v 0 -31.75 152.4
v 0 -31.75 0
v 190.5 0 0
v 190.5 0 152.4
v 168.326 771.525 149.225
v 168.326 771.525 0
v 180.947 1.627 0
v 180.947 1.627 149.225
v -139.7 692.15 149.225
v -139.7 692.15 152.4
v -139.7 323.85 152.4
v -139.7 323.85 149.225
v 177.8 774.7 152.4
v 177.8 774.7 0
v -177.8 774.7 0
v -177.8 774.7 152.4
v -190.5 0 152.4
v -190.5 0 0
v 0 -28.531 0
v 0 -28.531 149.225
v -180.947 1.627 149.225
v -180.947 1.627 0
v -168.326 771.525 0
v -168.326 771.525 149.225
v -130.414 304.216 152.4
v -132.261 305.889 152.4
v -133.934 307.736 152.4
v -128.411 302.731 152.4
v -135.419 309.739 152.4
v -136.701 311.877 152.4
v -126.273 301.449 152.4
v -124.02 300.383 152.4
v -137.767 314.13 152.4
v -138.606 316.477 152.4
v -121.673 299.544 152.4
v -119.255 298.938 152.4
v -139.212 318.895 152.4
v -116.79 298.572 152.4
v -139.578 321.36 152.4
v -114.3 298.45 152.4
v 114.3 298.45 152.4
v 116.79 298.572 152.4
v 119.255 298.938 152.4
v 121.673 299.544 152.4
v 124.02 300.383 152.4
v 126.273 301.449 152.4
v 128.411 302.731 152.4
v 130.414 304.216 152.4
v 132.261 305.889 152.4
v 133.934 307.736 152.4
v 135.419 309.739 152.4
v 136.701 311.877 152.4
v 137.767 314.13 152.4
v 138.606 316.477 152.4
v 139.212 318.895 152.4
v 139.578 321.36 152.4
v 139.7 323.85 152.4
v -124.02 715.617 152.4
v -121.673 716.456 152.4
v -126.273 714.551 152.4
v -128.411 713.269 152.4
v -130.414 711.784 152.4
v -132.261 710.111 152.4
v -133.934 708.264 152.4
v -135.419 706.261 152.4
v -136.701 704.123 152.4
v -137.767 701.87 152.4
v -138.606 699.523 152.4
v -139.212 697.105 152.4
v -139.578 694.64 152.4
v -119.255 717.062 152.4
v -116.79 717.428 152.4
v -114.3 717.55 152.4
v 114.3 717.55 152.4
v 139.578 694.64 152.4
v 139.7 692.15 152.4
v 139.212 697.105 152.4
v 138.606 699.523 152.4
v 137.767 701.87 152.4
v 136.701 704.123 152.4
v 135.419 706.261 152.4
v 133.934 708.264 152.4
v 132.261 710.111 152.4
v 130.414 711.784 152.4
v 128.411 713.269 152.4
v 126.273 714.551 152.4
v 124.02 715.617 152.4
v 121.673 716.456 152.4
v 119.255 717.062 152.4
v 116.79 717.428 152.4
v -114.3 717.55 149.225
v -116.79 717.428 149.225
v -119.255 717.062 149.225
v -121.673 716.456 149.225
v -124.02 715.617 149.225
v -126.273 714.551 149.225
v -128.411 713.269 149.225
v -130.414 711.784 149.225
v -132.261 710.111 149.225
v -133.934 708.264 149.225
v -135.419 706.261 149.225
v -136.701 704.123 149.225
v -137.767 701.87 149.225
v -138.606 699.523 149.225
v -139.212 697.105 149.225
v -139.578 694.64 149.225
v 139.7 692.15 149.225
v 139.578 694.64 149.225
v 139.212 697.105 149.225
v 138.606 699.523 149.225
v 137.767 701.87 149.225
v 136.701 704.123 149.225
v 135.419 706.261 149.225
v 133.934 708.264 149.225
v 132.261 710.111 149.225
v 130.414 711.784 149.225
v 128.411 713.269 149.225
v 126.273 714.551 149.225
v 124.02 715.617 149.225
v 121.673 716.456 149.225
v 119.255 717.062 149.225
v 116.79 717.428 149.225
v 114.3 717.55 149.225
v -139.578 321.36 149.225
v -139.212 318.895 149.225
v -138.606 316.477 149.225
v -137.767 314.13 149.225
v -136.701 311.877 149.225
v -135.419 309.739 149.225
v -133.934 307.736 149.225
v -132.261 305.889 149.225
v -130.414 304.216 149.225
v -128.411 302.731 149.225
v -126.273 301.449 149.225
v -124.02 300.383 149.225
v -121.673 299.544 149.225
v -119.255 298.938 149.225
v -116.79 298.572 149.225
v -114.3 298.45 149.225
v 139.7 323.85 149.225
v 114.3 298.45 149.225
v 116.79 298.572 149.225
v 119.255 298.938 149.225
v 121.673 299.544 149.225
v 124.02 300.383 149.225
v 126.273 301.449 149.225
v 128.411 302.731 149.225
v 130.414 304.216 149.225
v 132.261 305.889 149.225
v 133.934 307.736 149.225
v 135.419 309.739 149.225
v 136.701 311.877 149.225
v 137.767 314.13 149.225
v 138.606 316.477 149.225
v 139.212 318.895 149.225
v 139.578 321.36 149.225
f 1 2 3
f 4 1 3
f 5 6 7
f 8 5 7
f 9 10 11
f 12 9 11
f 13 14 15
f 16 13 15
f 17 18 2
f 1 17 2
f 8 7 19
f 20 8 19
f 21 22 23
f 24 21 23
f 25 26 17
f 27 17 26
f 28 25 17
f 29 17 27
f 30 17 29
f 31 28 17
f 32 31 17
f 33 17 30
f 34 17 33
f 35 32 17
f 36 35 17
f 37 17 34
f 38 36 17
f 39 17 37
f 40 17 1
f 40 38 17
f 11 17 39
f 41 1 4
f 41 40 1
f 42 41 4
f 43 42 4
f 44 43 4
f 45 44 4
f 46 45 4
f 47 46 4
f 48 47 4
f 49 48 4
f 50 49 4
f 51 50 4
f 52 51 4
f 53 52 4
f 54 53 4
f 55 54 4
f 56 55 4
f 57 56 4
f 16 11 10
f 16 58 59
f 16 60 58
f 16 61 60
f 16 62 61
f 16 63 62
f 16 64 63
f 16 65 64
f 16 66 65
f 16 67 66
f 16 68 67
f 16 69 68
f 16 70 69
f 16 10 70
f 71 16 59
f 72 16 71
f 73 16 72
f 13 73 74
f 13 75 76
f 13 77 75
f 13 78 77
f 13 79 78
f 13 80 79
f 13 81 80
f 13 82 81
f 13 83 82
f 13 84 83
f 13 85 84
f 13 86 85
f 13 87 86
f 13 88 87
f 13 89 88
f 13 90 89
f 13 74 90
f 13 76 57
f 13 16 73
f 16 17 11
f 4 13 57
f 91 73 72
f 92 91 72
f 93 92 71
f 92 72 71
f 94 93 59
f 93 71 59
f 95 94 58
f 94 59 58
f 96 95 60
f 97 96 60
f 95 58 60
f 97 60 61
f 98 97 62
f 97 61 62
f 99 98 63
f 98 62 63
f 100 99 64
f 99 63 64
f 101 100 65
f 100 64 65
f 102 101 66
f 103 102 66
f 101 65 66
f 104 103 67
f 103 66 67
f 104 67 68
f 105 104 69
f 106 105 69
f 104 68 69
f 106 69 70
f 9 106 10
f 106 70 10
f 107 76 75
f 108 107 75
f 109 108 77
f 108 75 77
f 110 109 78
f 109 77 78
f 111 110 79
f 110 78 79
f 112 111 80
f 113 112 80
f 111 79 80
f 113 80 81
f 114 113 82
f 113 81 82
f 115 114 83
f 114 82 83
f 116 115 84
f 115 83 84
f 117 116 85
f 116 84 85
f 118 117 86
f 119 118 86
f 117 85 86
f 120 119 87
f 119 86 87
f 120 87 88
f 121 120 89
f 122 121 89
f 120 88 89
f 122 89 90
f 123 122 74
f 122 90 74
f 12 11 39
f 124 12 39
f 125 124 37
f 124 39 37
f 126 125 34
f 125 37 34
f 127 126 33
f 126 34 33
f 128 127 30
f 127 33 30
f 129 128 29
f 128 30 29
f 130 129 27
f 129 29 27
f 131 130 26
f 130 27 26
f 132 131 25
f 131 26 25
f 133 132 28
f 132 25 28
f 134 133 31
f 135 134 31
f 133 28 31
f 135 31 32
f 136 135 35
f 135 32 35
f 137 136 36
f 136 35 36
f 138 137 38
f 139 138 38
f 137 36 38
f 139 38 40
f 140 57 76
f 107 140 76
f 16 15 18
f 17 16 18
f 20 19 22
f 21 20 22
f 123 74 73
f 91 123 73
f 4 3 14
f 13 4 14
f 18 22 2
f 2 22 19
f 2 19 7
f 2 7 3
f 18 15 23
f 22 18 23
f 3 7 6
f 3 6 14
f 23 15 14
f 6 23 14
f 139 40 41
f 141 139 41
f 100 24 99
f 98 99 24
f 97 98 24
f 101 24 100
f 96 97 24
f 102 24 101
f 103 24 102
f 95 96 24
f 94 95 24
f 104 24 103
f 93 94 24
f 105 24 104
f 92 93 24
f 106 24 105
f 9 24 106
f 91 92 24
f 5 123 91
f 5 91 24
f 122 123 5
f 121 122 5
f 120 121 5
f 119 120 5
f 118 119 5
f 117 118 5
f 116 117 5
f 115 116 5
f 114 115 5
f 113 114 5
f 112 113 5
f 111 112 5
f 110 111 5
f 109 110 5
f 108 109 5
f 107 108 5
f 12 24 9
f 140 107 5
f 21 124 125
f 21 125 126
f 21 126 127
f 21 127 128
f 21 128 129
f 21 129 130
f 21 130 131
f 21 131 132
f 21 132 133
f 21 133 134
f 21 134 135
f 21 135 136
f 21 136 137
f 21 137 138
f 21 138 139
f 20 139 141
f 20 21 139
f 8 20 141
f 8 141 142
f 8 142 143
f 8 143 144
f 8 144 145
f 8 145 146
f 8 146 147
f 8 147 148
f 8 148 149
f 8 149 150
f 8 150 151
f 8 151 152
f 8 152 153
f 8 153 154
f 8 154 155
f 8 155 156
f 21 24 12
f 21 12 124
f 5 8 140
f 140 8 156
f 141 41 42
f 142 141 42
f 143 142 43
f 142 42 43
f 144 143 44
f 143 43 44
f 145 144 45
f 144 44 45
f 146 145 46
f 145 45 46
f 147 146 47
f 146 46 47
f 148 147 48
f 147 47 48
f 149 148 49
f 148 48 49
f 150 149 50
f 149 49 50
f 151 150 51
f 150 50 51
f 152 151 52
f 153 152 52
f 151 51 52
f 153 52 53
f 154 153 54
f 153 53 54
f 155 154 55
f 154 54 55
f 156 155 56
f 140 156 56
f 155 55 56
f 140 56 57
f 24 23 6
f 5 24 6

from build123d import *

# Parameters (mm, degrees)
F1_DEPTH = 152.4
F3_DEPTH = 149.225
F5_DEPTH = 25.4


with BuildPart() as f1:
    # F0 (on Top) → F1 (new body)
    with BuildSketch(Plane.XY):
        Polygon((-177.8, 774.7), (-190.5, 0), (190.5, 0), (177.8, 774.7), align=None)
        Polygon((190.5, 0), (-190.5, 0), (0, -31.75), align=None)
    extrude(amount=F1_DEPTH)

    # F2 (on face) → F3 (cut)
    with BuildSketch(Plane(origin=(0, 0, 0), x_dir=(1, 0, 0), z_dir=(0, 0, -1))):
        Polygon((0, 28.5312048277), (-180.9470539995, -1.6266375055), (-168.3257693684, -771.525), (168.3257693684, -771.525), (180.9470539995, -1.6266375055), align=None)
    extrude(amount=-F3_DEPTH, mode=Mode.SUBTRACT)

    # F4 (on face) → F5 (cut)
    with BuildSketch(Plane.XY.offset(152.4)):
        with BuildLine():
            Line((114.3, 717.55), (-114.3, 717.55))
            ThreePointArc((-114.3, 717.55), (-132.2605122421, 710.1105122421), (-139.7, 692.15))
            Line((-139.7, 692.15), (-139.7, 323.85))
            ThreePointArc((-139.7, 323.85), (-132.2605122421, 305.8894877579), (-114.3, 298.45))
            Line((-114.3, 298.45), (114.3, 298.45))
            ThreePointArc((114.3, 298.45), (132.2605122421, 305.8894877579), (139.7, 323.85))
            Line((139.7, 323.85), (139.7, 692.15))
            ThreePointArc((139.7, 692.15), (132.2605122421, 710.1105122421), (114.3, 717.55))
        make_face()
    extrude(amount=-F5_DEPTH, mode=Mode.SUBTRACT)


solid = f1.part
